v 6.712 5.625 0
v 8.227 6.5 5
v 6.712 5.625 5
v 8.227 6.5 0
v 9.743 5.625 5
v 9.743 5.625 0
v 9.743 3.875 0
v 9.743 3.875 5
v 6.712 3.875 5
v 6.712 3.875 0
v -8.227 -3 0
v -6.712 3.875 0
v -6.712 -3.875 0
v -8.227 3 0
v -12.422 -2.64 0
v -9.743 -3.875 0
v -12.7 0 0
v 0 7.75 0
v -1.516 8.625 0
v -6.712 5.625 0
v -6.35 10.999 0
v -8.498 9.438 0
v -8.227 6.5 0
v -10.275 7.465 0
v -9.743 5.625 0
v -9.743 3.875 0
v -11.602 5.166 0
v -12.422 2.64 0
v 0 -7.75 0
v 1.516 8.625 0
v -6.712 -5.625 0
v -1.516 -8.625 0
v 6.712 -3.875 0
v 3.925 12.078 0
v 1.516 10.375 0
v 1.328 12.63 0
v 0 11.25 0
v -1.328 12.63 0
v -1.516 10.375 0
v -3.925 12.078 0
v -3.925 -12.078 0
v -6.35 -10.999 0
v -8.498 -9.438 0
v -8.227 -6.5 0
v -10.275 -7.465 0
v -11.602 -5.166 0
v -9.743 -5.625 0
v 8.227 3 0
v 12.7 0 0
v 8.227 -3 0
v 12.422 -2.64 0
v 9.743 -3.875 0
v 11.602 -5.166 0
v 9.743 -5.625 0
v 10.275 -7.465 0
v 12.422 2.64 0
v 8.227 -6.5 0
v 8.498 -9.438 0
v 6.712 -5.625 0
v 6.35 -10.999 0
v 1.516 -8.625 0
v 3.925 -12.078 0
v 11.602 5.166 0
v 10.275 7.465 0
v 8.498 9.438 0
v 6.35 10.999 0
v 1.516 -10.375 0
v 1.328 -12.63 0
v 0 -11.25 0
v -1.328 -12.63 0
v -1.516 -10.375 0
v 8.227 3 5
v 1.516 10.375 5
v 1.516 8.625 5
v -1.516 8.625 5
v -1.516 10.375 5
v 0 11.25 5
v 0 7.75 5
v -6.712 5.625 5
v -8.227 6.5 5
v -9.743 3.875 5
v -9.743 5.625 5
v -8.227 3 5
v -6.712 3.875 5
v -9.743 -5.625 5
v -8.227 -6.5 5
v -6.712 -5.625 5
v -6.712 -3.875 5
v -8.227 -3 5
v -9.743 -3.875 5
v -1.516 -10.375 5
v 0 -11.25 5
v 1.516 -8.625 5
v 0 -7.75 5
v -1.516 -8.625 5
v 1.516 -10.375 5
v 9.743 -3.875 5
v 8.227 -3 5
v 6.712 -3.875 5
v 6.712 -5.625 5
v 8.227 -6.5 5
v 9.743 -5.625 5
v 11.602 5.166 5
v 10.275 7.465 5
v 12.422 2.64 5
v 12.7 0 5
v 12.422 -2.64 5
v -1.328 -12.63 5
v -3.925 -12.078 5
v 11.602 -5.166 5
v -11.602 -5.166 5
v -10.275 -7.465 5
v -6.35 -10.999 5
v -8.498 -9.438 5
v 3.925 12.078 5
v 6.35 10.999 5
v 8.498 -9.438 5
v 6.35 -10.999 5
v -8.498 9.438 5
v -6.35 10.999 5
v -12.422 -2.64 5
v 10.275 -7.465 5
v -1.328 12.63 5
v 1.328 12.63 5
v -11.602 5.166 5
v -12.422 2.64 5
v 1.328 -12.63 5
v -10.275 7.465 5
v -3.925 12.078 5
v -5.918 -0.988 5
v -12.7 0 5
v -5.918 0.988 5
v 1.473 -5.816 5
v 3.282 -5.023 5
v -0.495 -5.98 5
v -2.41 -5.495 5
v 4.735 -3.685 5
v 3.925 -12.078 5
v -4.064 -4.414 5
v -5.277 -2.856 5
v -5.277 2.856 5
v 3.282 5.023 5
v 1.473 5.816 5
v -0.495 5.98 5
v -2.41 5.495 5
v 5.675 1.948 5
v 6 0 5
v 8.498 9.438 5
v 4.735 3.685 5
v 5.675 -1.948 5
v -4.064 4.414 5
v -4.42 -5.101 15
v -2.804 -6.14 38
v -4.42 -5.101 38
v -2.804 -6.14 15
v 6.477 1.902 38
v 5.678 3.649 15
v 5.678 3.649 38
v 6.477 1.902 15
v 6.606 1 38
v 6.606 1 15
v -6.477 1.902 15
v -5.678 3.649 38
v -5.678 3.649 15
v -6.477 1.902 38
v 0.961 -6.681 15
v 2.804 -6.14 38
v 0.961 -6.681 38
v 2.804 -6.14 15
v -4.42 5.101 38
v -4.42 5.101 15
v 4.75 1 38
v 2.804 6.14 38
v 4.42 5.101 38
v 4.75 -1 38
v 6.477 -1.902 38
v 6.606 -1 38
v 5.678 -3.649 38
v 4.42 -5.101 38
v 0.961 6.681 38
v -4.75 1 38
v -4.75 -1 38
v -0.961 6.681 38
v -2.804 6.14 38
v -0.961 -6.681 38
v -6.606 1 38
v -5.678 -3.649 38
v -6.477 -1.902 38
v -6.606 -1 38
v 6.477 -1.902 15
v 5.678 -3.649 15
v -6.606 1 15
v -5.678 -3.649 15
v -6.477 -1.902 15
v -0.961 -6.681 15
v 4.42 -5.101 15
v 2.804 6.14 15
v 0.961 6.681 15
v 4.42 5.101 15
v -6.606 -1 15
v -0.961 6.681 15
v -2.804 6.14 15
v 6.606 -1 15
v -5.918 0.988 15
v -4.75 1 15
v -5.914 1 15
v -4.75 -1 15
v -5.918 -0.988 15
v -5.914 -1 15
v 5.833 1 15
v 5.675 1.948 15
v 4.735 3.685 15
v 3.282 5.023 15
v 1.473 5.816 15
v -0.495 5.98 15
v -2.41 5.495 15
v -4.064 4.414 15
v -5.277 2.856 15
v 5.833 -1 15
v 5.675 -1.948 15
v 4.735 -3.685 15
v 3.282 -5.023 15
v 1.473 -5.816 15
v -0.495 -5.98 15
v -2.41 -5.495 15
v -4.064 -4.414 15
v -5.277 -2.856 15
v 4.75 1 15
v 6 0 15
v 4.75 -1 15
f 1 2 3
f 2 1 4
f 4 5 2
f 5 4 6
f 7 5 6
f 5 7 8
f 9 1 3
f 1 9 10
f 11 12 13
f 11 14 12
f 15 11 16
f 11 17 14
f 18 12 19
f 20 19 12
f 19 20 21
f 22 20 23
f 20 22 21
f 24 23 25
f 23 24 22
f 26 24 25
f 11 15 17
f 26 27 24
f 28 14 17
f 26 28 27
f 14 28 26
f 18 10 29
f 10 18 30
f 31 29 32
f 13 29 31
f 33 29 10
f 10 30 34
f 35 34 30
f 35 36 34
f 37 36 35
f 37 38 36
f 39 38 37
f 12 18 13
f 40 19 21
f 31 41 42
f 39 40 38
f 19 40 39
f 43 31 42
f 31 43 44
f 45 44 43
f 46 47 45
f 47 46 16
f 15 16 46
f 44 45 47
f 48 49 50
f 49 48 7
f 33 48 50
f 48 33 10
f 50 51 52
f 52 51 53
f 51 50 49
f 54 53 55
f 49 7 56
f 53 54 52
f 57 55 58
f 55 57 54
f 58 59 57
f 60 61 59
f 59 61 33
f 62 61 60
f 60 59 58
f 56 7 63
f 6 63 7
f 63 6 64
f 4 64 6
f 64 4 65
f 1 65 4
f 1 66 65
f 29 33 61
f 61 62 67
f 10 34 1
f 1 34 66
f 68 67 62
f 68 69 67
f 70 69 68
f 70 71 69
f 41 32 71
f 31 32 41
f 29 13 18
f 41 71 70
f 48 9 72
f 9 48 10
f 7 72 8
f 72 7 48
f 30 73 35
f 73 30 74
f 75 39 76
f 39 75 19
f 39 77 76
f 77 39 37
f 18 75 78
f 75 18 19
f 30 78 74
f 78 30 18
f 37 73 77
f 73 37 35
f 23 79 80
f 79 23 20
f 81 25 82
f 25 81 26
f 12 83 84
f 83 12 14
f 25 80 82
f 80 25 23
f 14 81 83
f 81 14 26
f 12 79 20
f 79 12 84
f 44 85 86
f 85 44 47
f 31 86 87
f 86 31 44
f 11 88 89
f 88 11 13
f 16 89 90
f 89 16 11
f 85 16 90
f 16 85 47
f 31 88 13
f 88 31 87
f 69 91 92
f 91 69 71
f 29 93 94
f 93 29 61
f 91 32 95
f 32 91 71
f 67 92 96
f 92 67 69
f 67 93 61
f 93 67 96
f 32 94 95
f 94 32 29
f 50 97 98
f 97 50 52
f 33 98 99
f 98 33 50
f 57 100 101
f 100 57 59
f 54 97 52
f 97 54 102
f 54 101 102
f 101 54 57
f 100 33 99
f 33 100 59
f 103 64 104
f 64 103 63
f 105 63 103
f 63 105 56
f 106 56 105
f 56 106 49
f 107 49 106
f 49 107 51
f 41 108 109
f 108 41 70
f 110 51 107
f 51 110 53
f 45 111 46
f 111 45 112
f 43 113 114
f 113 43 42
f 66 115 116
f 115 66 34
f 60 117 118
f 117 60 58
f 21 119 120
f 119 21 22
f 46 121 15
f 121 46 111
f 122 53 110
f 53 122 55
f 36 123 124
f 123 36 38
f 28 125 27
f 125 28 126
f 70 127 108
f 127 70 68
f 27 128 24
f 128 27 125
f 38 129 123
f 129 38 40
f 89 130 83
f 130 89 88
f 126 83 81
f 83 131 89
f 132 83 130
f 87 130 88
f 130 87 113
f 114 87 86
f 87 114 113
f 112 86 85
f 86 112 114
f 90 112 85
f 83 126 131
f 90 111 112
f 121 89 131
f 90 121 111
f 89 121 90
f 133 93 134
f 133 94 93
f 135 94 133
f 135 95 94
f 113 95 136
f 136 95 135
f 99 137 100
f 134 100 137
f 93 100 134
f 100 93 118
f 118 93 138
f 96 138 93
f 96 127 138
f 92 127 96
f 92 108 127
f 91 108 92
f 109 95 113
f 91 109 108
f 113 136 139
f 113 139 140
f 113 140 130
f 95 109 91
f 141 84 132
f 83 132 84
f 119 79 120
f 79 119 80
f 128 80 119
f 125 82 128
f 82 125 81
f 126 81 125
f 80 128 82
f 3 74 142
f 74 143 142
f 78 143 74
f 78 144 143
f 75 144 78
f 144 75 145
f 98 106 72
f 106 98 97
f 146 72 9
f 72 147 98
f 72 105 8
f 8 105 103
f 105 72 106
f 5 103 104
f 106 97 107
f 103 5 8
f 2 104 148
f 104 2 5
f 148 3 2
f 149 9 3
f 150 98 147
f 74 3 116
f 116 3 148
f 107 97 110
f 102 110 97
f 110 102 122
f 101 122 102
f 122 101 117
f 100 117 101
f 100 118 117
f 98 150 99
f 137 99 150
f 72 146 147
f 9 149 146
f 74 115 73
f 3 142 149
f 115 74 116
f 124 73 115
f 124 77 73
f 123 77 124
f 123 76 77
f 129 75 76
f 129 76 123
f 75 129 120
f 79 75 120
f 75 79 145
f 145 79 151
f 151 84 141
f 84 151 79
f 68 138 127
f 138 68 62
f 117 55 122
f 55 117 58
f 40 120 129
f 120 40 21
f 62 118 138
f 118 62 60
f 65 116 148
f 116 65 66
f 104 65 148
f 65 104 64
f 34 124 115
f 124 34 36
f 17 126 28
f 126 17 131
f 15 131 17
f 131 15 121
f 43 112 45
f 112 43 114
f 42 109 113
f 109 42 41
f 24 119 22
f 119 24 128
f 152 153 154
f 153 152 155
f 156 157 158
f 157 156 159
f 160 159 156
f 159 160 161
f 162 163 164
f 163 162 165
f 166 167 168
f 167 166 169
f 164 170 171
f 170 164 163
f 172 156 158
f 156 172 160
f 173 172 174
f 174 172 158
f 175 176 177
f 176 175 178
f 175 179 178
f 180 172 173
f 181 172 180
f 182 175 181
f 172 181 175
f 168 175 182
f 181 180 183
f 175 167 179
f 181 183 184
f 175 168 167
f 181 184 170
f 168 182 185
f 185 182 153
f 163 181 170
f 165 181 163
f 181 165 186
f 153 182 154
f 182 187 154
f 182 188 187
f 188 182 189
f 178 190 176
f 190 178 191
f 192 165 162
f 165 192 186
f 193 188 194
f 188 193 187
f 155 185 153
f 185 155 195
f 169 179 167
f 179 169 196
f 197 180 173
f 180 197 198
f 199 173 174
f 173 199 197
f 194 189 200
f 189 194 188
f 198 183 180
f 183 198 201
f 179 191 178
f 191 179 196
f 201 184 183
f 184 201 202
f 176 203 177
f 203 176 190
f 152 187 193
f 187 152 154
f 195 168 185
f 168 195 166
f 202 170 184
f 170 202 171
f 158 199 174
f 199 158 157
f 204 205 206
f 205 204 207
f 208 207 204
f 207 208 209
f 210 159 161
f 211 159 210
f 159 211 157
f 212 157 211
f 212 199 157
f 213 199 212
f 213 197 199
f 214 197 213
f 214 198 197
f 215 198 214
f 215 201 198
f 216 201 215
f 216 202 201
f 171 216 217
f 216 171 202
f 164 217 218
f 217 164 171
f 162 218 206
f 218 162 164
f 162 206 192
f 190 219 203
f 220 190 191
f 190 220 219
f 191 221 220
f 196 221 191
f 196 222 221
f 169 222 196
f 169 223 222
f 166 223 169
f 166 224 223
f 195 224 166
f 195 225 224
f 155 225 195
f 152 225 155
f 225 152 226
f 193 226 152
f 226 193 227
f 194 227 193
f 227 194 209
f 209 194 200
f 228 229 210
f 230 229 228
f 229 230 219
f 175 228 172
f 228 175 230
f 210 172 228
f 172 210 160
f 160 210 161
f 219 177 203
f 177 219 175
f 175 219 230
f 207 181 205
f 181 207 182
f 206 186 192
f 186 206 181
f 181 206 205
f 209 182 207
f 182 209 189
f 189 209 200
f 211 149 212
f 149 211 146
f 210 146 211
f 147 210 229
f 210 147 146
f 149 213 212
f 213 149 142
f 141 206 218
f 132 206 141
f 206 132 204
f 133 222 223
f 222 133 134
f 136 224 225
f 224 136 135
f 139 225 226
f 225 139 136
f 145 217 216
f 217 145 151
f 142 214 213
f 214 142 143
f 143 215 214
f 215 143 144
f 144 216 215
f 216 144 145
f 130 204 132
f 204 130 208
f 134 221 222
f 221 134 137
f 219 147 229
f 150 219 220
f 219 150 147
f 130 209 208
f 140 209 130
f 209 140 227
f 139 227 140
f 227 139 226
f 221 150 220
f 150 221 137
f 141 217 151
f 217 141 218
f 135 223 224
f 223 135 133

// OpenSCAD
axel_mount();

module axel_mount() {
	// motor mount
	difference() {
		cylinder(r=25.4/2, h=5);
		mounting_holes();
	}

	// offset
	translate([0,0,5]){
		cylinder(r=6, h=10);
	}

	// wheel adaptor
	translate([0,0,15]){
		difference(){
			difference() {
				cylinder(r=13.5/2, h=23);
				translate([13.5/2-2,-1,0])
					cube([2, 2, 23]);
			}
			translate([-13.5/2,-1,0])
				cube([2, 2, 23]);
		}
	}
}

module mounting_holes() {
	for (i = [0:5]){
		rotate([0,0,30 + 60 * i]) {
			translate([9.5,0,0]){
				cylinder(r=1.75, h=12);
			}
		}
	}
}
